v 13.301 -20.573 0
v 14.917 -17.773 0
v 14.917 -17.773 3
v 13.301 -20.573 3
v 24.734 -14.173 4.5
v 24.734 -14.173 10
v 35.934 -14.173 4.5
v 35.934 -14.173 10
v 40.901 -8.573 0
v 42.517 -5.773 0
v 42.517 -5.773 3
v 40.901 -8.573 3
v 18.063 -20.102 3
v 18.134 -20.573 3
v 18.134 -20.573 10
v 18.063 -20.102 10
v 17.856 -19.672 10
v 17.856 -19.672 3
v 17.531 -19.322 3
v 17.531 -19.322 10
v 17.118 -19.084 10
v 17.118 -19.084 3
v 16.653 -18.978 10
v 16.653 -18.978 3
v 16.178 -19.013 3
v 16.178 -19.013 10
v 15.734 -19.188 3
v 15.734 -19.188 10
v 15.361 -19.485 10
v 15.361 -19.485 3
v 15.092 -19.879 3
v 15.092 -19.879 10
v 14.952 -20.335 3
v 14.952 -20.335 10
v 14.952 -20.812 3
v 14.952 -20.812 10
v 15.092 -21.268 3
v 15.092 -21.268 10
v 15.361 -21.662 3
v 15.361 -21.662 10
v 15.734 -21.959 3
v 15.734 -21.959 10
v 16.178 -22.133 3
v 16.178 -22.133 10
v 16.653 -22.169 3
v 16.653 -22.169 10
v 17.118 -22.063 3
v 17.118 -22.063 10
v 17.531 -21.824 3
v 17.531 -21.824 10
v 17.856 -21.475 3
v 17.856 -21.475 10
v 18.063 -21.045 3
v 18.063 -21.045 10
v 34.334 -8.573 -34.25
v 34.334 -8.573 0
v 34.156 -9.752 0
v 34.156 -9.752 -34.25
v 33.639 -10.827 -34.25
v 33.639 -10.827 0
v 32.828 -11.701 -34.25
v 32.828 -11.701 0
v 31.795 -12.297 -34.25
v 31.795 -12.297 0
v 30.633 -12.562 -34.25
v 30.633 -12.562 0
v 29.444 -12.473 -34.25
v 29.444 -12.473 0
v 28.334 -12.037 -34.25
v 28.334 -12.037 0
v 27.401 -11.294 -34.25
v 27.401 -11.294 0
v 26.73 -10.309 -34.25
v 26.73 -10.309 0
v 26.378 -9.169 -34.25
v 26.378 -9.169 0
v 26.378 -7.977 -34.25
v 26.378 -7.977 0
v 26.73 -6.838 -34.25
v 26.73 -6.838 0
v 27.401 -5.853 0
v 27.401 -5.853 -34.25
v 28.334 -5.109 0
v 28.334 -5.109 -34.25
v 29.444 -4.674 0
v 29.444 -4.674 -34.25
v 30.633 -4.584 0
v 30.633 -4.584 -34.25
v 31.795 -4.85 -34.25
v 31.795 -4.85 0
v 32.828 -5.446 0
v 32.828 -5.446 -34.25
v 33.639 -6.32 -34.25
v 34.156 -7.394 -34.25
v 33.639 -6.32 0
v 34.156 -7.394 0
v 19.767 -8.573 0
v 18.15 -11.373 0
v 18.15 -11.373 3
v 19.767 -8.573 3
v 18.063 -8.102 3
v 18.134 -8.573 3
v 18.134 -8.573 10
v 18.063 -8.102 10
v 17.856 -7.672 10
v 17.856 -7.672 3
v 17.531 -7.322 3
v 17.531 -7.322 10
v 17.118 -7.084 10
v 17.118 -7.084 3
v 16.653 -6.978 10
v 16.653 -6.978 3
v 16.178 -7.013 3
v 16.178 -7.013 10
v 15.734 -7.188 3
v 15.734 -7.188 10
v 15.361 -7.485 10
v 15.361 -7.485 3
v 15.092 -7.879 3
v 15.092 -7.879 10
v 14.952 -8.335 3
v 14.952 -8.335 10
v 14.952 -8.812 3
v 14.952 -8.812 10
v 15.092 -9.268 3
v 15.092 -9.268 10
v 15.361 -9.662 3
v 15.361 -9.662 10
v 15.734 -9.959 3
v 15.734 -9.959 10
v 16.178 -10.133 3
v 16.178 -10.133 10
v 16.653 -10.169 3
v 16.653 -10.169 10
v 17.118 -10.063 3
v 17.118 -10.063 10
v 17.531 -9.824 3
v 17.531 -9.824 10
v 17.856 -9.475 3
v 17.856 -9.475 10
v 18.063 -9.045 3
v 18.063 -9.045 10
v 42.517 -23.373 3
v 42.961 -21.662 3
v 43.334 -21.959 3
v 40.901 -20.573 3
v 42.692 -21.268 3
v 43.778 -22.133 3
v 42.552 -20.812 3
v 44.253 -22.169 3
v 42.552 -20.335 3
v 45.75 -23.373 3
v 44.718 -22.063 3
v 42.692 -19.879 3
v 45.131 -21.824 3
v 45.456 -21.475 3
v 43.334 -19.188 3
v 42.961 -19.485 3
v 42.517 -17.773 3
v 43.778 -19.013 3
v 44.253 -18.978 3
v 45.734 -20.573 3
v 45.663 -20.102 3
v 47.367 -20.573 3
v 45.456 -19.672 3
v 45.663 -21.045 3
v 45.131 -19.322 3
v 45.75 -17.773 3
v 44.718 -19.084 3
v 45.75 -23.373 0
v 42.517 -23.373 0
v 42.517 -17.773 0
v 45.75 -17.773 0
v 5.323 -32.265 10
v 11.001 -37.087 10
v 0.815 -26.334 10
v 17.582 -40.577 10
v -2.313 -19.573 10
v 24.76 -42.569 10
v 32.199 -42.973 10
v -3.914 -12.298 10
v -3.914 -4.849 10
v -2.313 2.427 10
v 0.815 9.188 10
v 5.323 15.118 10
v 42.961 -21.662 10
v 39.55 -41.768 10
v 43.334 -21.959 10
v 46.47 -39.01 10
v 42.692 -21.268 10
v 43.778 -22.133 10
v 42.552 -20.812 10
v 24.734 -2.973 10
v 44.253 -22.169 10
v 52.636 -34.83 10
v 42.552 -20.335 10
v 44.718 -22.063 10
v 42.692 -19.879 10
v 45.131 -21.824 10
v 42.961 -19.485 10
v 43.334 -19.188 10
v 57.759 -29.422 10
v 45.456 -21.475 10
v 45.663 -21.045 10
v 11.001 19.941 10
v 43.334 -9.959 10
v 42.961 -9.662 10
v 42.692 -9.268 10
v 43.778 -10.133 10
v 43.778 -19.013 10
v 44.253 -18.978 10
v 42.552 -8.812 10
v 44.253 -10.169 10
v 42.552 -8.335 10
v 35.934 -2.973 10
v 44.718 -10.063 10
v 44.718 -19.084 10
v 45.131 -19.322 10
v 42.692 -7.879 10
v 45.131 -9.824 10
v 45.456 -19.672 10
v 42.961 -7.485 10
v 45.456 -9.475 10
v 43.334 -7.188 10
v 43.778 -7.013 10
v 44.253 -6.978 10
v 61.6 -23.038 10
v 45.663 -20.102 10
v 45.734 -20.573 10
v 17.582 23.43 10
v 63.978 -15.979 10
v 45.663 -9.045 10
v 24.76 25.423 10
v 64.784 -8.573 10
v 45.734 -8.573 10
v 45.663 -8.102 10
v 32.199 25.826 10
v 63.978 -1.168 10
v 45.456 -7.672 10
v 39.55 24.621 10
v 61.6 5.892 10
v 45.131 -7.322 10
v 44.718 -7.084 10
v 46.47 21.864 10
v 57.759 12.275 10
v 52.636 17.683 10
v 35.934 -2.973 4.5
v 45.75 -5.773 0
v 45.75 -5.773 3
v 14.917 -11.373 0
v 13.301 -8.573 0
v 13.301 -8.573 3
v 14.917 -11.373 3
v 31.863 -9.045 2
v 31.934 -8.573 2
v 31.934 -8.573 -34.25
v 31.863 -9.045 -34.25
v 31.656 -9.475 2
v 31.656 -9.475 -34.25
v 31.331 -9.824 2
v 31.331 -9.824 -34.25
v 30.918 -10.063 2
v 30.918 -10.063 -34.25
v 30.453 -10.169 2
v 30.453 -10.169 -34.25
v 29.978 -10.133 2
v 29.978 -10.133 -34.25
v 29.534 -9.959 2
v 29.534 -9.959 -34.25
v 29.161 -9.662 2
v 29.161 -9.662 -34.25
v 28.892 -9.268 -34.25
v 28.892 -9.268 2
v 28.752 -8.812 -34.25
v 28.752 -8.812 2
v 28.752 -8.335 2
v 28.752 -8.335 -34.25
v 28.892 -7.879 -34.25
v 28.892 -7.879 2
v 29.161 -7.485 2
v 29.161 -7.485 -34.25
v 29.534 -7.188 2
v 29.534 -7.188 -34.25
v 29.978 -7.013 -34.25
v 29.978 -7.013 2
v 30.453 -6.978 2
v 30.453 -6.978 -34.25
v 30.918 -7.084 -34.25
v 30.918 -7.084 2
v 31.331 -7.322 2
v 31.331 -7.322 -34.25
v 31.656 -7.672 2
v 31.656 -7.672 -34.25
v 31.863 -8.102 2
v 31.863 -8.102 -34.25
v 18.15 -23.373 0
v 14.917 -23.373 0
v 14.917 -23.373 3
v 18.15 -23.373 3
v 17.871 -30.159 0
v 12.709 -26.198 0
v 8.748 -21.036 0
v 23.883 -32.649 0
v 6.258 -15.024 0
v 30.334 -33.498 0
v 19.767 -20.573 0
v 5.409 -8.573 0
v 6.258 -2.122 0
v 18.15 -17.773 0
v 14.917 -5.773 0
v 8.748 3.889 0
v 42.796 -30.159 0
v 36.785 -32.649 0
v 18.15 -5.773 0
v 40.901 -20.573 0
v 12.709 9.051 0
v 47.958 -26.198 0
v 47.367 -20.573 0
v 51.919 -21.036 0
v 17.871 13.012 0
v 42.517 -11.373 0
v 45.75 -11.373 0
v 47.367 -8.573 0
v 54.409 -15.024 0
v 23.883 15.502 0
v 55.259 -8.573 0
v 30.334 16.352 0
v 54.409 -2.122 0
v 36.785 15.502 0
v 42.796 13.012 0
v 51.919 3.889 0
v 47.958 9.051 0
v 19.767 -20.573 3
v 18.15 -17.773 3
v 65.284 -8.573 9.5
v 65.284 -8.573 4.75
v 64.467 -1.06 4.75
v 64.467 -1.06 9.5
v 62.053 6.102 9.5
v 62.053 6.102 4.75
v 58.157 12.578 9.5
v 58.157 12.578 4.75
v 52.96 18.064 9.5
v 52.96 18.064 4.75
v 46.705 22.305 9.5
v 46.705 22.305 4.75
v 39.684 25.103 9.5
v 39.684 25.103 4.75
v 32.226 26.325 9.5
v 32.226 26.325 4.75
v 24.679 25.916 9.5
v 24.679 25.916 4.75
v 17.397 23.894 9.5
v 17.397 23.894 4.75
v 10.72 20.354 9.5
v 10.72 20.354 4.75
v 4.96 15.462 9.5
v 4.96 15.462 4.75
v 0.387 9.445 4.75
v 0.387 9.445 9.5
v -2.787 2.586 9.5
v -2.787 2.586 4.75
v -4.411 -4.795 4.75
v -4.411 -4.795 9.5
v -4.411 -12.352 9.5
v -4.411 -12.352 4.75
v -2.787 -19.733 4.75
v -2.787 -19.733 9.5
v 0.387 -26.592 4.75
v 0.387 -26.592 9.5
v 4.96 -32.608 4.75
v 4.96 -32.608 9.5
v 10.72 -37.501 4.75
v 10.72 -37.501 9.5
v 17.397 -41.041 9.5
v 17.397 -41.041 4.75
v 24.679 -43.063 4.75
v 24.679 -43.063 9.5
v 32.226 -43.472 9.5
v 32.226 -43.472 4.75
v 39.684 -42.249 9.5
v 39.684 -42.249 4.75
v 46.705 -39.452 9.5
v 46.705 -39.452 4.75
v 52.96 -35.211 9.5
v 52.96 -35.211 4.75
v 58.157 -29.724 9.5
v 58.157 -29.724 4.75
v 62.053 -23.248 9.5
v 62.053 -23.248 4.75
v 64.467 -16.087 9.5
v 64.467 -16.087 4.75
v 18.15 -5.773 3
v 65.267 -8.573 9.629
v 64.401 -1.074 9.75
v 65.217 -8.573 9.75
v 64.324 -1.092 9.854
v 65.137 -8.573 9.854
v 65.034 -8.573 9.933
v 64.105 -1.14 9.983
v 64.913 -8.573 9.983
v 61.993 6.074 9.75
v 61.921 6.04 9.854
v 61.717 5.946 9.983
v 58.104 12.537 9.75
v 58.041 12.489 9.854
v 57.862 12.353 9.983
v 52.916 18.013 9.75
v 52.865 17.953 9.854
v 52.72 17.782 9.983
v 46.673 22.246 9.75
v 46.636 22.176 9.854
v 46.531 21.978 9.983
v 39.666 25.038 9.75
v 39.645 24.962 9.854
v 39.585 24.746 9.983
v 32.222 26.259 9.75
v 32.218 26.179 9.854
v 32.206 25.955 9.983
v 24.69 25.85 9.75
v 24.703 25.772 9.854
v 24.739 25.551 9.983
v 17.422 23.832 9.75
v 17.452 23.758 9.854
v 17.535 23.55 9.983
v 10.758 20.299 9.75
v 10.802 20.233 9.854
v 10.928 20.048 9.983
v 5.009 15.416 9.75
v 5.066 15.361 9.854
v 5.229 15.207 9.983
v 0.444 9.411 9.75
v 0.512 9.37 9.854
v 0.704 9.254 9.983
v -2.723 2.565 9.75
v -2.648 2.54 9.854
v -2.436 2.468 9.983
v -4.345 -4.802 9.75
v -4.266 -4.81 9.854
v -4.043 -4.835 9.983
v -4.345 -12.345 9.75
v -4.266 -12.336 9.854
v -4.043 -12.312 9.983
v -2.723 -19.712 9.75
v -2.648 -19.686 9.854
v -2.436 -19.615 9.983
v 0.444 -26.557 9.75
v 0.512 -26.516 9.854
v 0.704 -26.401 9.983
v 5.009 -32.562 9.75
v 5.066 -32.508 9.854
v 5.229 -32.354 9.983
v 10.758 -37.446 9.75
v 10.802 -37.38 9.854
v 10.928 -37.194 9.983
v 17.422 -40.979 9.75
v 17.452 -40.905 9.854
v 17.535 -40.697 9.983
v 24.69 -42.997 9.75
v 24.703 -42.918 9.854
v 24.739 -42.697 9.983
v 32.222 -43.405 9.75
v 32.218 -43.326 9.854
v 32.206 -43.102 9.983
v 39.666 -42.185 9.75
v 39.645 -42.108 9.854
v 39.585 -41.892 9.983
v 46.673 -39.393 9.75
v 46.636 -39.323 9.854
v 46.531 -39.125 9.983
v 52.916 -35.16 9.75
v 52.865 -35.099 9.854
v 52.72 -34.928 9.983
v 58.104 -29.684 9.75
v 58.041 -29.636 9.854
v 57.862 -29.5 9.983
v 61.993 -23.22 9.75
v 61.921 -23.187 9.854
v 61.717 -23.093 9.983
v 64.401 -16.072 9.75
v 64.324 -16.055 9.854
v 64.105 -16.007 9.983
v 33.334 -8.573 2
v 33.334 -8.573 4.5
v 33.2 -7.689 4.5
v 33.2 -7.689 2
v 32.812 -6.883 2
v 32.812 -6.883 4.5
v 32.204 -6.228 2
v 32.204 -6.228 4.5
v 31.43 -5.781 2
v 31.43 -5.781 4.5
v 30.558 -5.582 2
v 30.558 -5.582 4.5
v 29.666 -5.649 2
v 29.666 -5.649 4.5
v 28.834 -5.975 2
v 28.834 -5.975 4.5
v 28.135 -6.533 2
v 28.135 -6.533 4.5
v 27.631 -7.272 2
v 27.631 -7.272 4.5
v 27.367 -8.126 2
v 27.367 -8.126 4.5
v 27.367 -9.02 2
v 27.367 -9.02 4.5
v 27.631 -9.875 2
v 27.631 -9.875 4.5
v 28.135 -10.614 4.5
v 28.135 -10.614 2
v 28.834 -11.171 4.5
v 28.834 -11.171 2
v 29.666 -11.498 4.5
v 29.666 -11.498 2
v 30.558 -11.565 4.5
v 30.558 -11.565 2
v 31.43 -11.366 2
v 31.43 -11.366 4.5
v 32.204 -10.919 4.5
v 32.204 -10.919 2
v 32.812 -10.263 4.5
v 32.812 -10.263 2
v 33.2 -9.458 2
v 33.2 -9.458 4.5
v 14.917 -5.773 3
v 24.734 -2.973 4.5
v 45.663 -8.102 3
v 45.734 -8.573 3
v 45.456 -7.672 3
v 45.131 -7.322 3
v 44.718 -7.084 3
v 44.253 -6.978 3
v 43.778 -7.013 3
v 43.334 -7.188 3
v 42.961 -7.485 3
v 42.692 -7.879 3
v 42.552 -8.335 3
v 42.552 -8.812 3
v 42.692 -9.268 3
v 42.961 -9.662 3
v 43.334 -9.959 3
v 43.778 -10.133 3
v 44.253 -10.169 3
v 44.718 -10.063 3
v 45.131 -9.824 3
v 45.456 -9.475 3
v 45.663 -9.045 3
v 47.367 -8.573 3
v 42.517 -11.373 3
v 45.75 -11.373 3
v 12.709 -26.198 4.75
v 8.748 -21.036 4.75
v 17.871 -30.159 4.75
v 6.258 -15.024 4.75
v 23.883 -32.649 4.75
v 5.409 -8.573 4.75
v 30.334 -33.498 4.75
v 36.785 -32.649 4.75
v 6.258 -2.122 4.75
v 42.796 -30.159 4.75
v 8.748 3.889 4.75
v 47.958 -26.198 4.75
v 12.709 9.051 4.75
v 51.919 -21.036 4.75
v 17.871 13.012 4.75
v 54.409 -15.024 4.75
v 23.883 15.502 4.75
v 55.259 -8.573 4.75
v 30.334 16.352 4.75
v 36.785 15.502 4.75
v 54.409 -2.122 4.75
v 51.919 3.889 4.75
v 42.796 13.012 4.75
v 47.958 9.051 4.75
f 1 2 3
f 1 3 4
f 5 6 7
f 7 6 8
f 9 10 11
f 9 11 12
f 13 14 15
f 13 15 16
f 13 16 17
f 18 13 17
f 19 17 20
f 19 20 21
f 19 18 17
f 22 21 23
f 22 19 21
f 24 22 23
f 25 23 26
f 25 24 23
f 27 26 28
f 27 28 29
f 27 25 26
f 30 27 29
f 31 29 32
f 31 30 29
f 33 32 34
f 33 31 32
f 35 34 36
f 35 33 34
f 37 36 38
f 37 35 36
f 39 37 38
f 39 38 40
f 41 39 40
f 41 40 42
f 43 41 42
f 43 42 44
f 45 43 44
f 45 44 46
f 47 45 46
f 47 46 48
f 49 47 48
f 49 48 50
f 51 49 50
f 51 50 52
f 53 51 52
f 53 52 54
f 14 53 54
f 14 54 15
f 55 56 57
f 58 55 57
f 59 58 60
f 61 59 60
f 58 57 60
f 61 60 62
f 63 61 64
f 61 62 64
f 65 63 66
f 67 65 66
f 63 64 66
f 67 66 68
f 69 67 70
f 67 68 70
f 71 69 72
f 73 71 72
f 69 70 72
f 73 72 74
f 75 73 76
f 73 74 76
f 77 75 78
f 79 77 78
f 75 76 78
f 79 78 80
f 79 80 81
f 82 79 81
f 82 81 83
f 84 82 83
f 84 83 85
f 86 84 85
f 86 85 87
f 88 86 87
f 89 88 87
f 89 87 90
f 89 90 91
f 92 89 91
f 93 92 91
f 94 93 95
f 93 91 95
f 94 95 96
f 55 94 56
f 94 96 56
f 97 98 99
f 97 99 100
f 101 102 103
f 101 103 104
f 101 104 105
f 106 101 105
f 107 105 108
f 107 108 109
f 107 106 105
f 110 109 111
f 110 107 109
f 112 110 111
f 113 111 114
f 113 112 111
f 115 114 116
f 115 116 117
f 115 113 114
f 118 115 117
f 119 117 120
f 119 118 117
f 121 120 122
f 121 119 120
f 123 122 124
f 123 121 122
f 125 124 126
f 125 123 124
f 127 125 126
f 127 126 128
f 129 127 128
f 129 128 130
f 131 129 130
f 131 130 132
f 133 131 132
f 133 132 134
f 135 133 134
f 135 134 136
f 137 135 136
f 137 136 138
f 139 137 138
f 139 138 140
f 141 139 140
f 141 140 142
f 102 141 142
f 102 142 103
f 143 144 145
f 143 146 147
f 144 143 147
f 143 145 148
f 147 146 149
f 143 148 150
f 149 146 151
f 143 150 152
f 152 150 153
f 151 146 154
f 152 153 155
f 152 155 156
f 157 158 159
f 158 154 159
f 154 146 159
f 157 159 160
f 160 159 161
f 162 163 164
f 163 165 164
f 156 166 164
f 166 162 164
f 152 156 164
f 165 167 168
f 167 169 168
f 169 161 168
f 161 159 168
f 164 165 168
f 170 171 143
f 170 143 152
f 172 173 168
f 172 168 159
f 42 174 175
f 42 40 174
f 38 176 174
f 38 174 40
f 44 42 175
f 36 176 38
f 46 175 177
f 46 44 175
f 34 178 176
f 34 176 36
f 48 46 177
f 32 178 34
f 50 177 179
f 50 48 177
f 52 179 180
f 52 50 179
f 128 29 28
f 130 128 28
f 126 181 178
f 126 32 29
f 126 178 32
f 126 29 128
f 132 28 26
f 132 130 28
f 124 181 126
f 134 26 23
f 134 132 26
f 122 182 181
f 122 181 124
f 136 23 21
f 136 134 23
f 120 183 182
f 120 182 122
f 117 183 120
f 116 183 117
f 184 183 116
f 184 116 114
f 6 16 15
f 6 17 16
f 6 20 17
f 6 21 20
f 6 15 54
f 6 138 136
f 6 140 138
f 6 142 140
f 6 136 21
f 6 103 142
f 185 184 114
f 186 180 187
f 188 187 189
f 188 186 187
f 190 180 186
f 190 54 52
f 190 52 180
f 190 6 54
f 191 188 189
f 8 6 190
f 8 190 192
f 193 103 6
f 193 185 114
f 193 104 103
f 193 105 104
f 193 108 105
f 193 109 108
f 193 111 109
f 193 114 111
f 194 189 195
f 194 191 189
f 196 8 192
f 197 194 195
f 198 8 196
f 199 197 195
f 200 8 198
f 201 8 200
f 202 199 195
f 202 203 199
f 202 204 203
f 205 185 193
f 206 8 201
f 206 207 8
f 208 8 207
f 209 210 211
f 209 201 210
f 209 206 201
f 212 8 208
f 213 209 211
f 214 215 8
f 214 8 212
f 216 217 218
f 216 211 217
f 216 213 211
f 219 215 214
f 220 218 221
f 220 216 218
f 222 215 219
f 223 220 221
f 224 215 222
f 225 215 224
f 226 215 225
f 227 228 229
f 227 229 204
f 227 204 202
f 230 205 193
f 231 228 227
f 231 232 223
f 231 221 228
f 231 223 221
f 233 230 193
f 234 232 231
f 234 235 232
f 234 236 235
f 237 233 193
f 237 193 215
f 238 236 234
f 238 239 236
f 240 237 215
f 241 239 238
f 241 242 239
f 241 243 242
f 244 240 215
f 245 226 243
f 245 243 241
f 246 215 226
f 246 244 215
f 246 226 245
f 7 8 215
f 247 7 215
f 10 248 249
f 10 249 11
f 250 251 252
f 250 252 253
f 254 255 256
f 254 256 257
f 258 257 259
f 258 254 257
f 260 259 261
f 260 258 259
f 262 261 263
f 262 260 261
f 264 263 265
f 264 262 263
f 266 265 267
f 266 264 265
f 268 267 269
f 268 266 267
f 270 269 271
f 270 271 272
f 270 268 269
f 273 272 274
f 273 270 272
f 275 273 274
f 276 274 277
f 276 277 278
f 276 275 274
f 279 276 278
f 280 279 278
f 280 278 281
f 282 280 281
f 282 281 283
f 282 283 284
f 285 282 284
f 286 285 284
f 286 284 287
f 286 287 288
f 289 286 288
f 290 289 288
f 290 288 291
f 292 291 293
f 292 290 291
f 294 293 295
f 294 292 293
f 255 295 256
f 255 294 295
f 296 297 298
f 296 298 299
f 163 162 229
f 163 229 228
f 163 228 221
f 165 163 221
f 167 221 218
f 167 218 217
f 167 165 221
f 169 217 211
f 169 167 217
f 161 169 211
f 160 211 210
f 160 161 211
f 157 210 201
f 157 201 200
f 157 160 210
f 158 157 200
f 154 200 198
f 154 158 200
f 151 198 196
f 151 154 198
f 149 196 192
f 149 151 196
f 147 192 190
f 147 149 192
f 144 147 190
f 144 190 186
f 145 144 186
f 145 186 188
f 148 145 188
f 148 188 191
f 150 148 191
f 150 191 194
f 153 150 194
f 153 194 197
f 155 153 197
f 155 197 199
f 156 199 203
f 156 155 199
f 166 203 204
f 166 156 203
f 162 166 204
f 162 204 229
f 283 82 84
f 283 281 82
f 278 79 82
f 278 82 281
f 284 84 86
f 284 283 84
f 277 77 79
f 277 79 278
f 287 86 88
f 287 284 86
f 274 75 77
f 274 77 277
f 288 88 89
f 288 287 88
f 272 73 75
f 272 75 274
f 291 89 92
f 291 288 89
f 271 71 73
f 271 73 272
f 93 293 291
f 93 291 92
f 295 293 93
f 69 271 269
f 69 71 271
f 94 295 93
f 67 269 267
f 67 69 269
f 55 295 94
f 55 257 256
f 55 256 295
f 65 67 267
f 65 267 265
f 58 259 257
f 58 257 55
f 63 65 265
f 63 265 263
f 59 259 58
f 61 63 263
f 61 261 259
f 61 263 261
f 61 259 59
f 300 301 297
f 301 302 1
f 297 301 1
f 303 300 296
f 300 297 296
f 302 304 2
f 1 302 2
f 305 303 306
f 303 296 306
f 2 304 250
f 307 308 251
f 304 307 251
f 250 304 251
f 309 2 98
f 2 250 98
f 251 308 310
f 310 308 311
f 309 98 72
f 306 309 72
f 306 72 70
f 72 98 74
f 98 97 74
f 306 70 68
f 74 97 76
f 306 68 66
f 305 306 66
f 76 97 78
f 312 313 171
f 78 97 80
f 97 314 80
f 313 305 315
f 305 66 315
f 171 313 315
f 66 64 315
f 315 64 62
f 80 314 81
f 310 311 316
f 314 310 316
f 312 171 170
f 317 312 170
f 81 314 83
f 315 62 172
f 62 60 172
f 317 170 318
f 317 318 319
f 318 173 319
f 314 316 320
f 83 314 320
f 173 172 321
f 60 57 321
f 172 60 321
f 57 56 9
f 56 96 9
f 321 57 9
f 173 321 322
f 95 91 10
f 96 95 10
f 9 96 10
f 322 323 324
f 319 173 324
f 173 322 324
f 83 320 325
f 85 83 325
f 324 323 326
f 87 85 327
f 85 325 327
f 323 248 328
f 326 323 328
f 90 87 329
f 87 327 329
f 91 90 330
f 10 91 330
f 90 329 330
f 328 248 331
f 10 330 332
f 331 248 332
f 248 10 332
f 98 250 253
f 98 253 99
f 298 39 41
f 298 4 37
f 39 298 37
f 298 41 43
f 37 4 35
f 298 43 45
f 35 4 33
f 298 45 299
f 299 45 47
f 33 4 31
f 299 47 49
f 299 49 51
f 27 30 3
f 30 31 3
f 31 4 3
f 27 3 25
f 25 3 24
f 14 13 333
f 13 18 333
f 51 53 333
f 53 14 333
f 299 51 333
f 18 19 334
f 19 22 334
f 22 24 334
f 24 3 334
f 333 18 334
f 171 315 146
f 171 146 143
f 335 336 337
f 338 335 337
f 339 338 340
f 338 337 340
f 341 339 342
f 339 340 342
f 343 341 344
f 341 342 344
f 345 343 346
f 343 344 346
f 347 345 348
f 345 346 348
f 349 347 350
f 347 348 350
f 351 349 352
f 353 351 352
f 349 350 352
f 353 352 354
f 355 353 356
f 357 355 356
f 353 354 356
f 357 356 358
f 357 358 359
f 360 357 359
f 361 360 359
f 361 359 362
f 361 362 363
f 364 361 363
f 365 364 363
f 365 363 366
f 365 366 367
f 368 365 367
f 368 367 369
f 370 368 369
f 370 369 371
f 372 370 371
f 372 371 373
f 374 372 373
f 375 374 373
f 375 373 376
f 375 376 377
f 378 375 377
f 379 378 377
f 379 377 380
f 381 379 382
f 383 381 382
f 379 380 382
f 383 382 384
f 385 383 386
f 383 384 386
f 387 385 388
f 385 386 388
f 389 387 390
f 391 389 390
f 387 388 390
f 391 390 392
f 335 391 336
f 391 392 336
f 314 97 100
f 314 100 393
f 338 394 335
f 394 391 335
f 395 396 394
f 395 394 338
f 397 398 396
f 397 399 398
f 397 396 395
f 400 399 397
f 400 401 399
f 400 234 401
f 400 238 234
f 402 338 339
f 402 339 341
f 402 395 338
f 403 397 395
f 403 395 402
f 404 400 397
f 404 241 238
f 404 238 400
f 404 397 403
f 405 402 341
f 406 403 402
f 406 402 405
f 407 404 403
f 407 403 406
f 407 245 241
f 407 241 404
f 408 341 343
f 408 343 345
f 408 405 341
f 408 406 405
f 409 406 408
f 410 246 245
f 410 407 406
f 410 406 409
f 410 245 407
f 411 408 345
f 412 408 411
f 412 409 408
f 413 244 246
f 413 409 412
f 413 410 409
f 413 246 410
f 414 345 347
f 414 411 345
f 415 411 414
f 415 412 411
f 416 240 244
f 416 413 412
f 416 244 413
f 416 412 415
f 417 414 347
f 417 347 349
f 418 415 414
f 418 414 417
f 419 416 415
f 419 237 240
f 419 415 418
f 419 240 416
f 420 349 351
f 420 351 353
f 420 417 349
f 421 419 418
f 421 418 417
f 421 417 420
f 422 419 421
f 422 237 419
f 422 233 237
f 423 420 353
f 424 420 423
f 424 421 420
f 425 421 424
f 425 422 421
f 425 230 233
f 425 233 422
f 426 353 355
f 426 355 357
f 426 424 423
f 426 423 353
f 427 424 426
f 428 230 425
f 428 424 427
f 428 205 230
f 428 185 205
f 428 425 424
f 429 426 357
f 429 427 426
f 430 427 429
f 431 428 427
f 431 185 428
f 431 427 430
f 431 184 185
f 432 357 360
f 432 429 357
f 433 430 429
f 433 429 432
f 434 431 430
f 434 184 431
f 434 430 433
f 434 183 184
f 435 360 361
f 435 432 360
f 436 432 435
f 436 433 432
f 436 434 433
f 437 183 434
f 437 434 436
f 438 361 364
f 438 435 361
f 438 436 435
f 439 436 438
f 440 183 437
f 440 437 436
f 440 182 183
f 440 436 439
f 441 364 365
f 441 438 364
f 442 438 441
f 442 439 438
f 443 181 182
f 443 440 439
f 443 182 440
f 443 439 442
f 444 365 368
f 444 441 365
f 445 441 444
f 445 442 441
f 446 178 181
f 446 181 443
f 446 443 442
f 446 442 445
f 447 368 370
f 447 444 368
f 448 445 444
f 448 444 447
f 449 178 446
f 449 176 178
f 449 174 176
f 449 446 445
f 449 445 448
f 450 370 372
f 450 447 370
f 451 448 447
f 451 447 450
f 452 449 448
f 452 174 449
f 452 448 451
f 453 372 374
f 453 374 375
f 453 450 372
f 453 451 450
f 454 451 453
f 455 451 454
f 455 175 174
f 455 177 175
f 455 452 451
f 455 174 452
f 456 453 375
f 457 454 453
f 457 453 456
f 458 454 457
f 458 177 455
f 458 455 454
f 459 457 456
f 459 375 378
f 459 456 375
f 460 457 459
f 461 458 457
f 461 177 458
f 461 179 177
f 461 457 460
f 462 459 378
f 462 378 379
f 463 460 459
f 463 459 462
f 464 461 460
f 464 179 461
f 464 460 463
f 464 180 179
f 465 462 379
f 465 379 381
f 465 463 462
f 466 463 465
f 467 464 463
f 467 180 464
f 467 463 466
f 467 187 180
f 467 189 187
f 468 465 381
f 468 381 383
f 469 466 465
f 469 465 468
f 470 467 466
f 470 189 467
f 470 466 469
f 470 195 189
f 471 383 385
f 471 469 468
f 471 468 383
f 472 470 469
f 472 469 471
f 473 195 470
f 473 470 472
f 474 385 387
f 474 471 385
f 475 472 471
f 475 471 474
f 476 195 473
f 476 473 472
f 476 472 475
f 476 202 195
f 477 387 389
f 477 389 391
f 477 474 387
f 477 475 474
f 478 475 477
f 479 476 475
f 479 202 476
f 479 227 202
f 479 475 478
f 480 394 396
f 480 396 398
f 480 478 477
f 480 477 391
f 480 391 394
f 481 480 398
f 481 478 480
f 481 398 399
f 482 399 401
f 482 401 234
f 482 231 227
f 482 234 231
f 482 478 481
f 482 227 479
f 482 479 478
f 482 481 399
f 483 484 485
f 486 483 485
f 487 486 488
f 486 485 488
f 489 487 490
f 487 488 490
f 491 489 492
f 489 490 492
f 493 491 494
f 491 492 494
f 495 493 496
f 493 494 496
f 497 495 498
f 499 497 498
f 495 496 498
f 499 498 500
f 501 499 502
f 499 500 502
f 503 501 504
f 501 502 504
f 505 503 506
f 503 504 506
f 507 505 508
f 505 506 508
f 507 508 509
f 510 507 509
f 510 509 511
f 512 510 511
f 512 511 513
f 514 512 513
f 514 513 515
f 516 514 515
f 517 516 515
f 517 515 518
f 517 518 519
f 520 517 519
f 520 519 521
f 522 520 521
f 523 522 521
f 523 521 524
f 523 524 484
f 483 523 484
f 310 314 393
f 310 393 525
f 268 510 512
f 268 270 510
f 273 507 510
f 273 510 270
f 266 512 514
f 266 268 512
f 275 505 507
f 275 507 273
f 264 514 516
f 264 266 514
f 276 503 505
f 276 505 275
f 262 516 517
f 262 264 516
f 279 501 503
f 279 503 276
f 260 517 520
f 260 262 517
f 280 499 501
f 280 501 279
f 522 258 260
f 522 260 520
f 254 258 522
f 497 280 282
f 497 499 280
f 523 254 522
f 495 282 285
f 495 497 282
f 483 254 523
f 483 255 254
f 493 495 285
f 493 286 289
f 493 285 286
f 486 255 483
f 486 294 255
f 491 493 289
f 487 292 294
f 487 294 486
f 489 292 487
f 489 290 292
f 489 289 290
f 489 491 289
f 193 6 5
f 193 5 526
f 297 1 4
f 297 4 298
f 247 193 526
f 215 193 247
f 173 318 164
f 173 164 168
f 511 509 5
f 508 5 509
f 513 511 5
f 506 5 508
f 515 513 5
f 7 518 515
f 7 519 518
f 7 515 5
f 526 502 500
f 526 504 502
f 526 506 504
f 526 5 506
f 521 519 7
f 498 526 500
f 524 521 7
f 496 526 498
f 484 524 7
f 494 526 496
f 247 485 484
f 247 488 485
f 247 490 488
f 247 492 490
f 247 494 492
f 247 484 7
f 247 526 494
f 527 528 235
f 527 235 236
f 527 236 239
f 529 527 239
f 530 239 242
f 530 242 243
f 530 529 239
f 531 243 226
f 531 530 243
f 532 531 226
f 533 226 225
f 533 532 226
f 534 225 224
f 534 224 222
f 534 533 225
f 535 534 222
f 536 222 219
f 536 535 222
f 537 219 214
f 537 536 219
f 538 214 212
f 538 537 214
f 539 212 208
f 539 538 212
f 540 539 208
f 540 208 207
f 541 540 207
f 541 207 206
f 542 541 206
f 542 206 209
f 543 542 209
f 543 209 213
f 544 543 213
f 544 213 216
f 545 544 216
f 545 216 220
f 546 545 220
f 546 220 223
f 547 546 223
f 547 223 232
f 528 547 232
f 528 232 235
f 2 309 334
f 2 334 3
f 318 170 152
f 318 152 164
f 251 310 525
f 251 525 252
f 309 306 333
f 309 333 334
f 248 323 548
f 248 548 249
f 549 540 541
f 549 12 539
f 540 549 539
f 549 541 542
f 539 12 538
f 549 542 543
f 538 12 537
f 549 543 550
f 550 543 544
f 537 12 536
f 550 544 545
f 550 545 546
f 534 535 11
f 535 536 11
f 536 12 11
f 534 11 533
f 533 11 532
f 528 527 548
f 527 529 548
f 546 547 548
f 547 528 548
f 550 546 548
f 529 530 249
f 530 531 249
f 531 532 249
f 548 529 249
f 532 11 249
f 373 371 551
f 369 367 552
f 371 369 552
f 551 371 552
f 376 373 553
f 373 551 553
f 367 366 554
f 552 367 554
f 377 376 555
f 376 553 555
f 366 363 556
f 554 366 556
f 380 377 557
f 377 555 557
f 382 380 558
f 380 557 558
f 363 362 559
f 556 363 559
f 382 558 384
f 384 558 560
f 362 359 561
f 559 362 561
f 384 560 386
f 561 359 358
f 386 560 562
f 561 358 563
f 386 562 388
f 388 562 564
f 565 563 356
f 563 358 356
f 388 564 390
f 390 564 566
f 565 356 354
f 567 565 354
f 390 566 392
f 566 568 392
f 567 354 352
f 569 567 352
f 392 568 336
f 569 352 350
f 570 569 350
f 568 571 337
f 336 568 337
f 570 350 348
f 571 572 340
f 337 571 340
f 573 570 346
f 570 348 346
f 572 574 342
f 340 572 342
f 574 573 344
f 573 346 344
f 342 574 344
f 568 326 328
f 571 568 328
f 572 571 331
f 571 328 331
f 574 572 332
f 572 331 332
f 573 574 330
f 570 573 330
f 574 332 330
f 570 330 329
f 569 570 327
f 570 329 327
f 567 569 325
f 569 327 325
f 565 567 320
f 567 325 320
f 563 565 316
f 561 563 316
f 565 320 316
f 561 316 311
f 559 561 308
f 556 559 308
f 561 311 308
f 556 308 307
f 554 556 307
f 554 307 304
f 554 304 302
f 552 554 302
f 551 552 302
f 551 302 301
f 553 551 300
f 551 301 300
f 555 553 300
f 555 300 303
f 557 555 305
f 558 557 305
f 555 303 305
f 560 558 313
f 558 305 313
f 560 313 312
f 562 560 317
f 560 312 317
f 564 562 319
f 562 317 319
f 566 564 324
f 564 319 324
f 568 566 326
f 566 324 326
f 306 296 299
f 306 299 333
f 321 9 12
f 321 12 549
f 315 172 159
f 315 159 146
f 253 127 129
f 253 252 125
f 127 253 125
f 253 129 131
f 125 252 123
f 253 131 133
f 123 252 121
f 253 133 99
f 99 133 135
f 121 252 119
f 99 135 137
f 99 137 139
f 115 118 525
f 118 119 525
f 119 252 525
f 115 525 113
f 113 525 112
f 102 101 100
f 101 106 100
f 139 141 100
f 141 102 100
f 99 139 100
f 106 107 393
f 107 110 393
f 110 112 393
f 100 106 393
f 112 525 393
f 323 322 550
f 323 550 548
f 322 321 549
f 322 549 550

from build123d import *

# Parameters (mm, degrees)
F0_R      = 34.95
F0_R_2    = 24.925
F0_W      = 11.2
F0_H      = 11.2
F0_R_3    = 1.6
F0_R_4    = 3
F1_DEPTH  = 10
F2_R      = 0.5
F3_DEPTH  = 4.5
F4_DEPTH  = 4.75
F5_R      = 4
F5_R_2    = 1.6
F6_DEPTH  = 34.25
F7_DEPTH  = 3
F8_W      = 11.2
F8_H      = 11.2
F8_R      = 3
F8_R_2    = 1.6
F9_DEPTH  = 5.5
F10_DEPTH = 35.94117
F11_DEPTH = 8


# Not quite as in the source:
# - a feature names something its author has since deleted; it is built from what else it names


with BuildPart() as f1:
    # F0 (on Top) → F1 (new body)
    with BuildSketch(Plane.XY):
        with Locations((30.3336817496, -8.5733028001)):
            Circle(F0_R)
        with Locations((30.3336817496, -8.5733028001)):
            Circle(F0_R_2, mode=Mode.SUBTRACT)
        with Locations((30.3336817496, -8.5733028001)):
            Circle(F0_R_2)
        Polygon((18.1502625033, -17.7733028001), (19.766843257, -20.5733028001), (18.1502625033, -23.3733028001), (14.9171009958, -23.3733028001), (13.3005202421, -20.5733028001), (14.9171009958, -17.7733028001), align=None, mode=Mode.SUBTRACT)
        Polygon((45.7502625033, -17.7733028001), (47.366843257, -20.5733028001), (45.7502625033, -23.3733028001), (42.5171009958, -23.3733028001), (40.9005202421, -20.5733028001), (42.5171009958, -17.7733028001), align=None, mode=Mode.SUBTRACT)
        Polygon((42.5171009958, -11.3733028001), (40.9005202421, -8.5733028001), (42.5171009958, -5.7733028001), (45.7502625033, -5.7733028001), (47.366843257, -8.5733028001), (45.7502625033, -11.3733028001), align=None, mode=Mode.SUBTRACT)
        Polygon((14.9171009958, -11.3733028001), (13.3005202421, -8.5733028001), (14.9171009958, -5.7733028001), (18.1502625033, -5.7733028001), (19.766843257, -8.5733028001), (18.1502625033, -11.3733028001), align=None, mode=Mode.SUBTRACT)
        with Locations((30.3336817496, -8.5733028001)):
            Rectangle(F0_W, F0_H, mode=Mode.SUBTRACT)
        Polygon((42.5171009958, -5.7733028001), (40.9005202421, -8.5733028001), (42.5171009958, -11.3733028001), (45.7502625033, -11.3733028001), (47.366843257, -8.5733028001), (45.7502625033, -5.7733028001), align=None)
        with Locations((44.1336817496, -8.5733028001)):
            Circle(F0_R_3, mode=Mode.SUBTRACT)
        Polygon((45.7502625033, -23.3733028001), (47.366843257, -20.5733028001), (45.7502625033, -17.7733028001), (42.5171009958, -17.7733028001), (40.9005202421, -20.5733028001), (42.5171009958, -23.3733028001), align=None)
        with Locations((44.1336817496, -20.5733028001)):
            Circle(F0_R_3, mode=Mode.SUBTRACT)
        Polygon((18.1502625033, -23.3733028001), (19.766843257, -20.5733028001), (18.1502625033, -17.7733028001), (14.9171009958, -17.7733028001), (13.3005202421, -20.5733028001), (14.9171009958, -23.3733028001), align=None)
        with Locations((16.5336817496, -20.5733028001)):
            Circle(F0_R_3, mode=Mode.SUBTRACT)
        Polygon((14.9171009958, -5.7733028001), (13.3005202421, -8.5733028001), (14.9171009958, -11.3733028001), (18.1502625033, -11.3733028001), (19.766843257, -8.5733028001), (18.1502625033, -5.7733028001), align=None)
        with Locations((16.5336817496, -8.5733028001)):
            Circle(F0_R_3, mode=Mode.SUBTRACT)
        with Locations((30.3336817496, -8.5733028001)):
            Rectangle(F0_W, F0_H)
        with Locations((30.3336817496, -8.5733028001)):
            Circle(F0_R_4, mode=Mode.SUBTRACT)
        with Locations((30.3336817496, -8.5733028001)):
            Circle(F0_R_4)
        with Locations((30.3336817496, -8.5733028001)):
            Circle(F0_R_3, mode=Mode.SUBTRACT)
    extrude(amount=F1_DEPTH)

    # F2
    f2_edges = [f1.edges().sort_by_distance(p)[0] for p in [
        (-4.616318, -8.573303, 10),
    ]]
    fillet(f2_edges, radius=F2_R)

    # F0 (on Top) → F3 (join)
    with BuildSketch(Plane.XY):
        with Locations((30.3336817496, -8.5733028001)):
            Rectangle(F0_W, F0_H)
        with Locations((30.3336817496, -8.5733028001)):
            Circle(F0_R_4, mode=Mode.SUBTRACT)
        Polygon((18.1502625033, -23.3733028001), (19.766843257, -20.5733028001), (18.1502625033, -17.7733028001), (14.9171009958, -17.7733028001), (13.3005202421, -20.5733028001), (14.9171009958, -23.3733028001), align=None)
        with Locations((16.5336817496, -20.5733028001)):
            Circle(F0_R_3, mode=Mode.SUBTRACT)
        Polygon((45.7502625033, -23.3733028001), (47.366843257, -20.5733028001), (45.7502625033, -17.7733028001), (42.5171009958, -17.7733028001), (40.9005202421, -20.5733028001), (42.5171009958, -23.3733028001), align=None)
        with Locations((44.1336817496, -20.5733028001)):
            Circle(F0_R_3, mode=Mode.SUBTRACT)
    extrude(amount=F3_DEPTH)

    # F0 (on Top) → F4 (cut)
    with BuildSketch(Plane.XY):
        with Locations((30.3336817496, -8.5733028001)):
            Circle(F0_R)
        with Locations((30.3336817496, -8.5733028001)):
            Circle(F0_R_2, mode=Mode.SUBTRACT)
    extrude(amount=F4_DEPTH, mode=Mode.SUBTRACT)

    # F5 (on face) + F0 (on Top) → F6 (join)
    with BuildSketch(Plane(origin=(0, 0, 0), x_dir=(1, 0, 0), z_dir=(0, 0, -1))):
        with Locations((30.3336817496, 8.5733028001)):
            Circle(F5_R)
        with Locations((30.3336817496, 8.5733028001)):
            Circle(F5_R_2, mode=Mode.SUBTRACT)
    with BuildSketch(Plane.XY):
        with Locations((30.3336817496, -8.5733028001)):
            Circle(F0_R_4)
        with Locations((30.3336817496, -8.5733028001)):
            Circle(F0_R_3, mode=Mode.SUBTRACT)
    extrude(amount=F6_DEPTH, dir=(0, 0, -1))

    # F0 (on Top) → F7 (cut)
    with BuildSketch(Plane.XY):
        Polygon((45.7502625033, -23.3733028001), (47.366843257, -20.5733028001), (45.7502625033, -17.7733028001), (42.5171009958, -17.7733028001), (40.9005202421, -20.5733028001), (42.5171009958, -23.3733028001), align=None)
        with Locations((44.1336817496, -20.5733028001)):
            Circle(F0_R_3, mode=Mode.SUBTRACT)
        Polygon((42.5171009958, -5.7733028001), (40.9005202421, -8.5733028001), (42.5171009958, -11.3733028001), (45.7502625033, -11.3733028001), (47.366843257, -8.5733028001), (45.7502625033, -5.7733028001), align=None)
        with Locations((44.1336817496, -8.5733028001)):
            Circle(F0_R_3, mode=Mode.SUBTRACT)
        Polygon((14.9171009958, -5.7733028001), (13.3005202421, -8.5733028001), (14.9171009958, -11.3733028001), (18.1502625033, -11.3733028001), (19.766843257, -8.5733028001), (18.1502625033, -5.7733028001), align=None)
        with Locations((16.5336817496, -8.5733028001)):
            Circle(F0_R_3, mode=Mode.SUBTRACT)
        Polygon((18.1502625033, -23.3733028001), (19.766843257, -20.5733028001), (18.1502625033, -17.7733028001), (14.9171009958, -17.7733028001), (13.3005202421, -20.5733028001), (14.9171009958, -23.3733028001), align=None)
        with Locations((16.5336817496, -20.5733028001)):
            Circle(F0_R_3, mode=Mode.SUBTRACT)
    extrude(amount=F7_DEPTH, mode=Mode.SUBTRACT)

    # F8 (on face) → F9 (cut)
    with BuildSketch(Plane.XY.offset(10)):
        with Locations((30.3336817496, -8.5733028001)):
            Rectangle(F8_W, F8_H)
        with Locations((30.3336817496, -8.5733028001)):
            Circle(F8_R, mode=Mode.SUBTRACT)
        with Locations((30.3336817496, -8.5733028001)):
            Circle(F8_R)
        with Locations((30.3336817496, -8.5733028001)):
            Circle(F8_R_2, mode=Mode.SUBTRACT)
    extrude(amount=-F9_DEPTH, mode=Mode.SUBTRACT)

    # F0 (on Top) → F10 (cut)
    with BuildSketch(Plane.XY):
        with Locations((30.3336817496, -8.5733028001)):
            Circle(F0_R_3)
    extrude(amount=-F10_DEPTH, mode=Mode.SUBTRACT)

    # F8 (on face) → F11 (cut)
    with BuildSketch(Plane.XY.offset(10)):
        with Locations((30.3336817496, -8.5733028001)):
            Circle(F8_R)
        with Locations((30.3336817496, -8.5733028001)):
            Circle(F8_R_2, mode=Mode.SUBTRACT)
    extrude(amount=-F11_DEPTH, mode=Mode.SUBTRACT)


solid = f1.part
